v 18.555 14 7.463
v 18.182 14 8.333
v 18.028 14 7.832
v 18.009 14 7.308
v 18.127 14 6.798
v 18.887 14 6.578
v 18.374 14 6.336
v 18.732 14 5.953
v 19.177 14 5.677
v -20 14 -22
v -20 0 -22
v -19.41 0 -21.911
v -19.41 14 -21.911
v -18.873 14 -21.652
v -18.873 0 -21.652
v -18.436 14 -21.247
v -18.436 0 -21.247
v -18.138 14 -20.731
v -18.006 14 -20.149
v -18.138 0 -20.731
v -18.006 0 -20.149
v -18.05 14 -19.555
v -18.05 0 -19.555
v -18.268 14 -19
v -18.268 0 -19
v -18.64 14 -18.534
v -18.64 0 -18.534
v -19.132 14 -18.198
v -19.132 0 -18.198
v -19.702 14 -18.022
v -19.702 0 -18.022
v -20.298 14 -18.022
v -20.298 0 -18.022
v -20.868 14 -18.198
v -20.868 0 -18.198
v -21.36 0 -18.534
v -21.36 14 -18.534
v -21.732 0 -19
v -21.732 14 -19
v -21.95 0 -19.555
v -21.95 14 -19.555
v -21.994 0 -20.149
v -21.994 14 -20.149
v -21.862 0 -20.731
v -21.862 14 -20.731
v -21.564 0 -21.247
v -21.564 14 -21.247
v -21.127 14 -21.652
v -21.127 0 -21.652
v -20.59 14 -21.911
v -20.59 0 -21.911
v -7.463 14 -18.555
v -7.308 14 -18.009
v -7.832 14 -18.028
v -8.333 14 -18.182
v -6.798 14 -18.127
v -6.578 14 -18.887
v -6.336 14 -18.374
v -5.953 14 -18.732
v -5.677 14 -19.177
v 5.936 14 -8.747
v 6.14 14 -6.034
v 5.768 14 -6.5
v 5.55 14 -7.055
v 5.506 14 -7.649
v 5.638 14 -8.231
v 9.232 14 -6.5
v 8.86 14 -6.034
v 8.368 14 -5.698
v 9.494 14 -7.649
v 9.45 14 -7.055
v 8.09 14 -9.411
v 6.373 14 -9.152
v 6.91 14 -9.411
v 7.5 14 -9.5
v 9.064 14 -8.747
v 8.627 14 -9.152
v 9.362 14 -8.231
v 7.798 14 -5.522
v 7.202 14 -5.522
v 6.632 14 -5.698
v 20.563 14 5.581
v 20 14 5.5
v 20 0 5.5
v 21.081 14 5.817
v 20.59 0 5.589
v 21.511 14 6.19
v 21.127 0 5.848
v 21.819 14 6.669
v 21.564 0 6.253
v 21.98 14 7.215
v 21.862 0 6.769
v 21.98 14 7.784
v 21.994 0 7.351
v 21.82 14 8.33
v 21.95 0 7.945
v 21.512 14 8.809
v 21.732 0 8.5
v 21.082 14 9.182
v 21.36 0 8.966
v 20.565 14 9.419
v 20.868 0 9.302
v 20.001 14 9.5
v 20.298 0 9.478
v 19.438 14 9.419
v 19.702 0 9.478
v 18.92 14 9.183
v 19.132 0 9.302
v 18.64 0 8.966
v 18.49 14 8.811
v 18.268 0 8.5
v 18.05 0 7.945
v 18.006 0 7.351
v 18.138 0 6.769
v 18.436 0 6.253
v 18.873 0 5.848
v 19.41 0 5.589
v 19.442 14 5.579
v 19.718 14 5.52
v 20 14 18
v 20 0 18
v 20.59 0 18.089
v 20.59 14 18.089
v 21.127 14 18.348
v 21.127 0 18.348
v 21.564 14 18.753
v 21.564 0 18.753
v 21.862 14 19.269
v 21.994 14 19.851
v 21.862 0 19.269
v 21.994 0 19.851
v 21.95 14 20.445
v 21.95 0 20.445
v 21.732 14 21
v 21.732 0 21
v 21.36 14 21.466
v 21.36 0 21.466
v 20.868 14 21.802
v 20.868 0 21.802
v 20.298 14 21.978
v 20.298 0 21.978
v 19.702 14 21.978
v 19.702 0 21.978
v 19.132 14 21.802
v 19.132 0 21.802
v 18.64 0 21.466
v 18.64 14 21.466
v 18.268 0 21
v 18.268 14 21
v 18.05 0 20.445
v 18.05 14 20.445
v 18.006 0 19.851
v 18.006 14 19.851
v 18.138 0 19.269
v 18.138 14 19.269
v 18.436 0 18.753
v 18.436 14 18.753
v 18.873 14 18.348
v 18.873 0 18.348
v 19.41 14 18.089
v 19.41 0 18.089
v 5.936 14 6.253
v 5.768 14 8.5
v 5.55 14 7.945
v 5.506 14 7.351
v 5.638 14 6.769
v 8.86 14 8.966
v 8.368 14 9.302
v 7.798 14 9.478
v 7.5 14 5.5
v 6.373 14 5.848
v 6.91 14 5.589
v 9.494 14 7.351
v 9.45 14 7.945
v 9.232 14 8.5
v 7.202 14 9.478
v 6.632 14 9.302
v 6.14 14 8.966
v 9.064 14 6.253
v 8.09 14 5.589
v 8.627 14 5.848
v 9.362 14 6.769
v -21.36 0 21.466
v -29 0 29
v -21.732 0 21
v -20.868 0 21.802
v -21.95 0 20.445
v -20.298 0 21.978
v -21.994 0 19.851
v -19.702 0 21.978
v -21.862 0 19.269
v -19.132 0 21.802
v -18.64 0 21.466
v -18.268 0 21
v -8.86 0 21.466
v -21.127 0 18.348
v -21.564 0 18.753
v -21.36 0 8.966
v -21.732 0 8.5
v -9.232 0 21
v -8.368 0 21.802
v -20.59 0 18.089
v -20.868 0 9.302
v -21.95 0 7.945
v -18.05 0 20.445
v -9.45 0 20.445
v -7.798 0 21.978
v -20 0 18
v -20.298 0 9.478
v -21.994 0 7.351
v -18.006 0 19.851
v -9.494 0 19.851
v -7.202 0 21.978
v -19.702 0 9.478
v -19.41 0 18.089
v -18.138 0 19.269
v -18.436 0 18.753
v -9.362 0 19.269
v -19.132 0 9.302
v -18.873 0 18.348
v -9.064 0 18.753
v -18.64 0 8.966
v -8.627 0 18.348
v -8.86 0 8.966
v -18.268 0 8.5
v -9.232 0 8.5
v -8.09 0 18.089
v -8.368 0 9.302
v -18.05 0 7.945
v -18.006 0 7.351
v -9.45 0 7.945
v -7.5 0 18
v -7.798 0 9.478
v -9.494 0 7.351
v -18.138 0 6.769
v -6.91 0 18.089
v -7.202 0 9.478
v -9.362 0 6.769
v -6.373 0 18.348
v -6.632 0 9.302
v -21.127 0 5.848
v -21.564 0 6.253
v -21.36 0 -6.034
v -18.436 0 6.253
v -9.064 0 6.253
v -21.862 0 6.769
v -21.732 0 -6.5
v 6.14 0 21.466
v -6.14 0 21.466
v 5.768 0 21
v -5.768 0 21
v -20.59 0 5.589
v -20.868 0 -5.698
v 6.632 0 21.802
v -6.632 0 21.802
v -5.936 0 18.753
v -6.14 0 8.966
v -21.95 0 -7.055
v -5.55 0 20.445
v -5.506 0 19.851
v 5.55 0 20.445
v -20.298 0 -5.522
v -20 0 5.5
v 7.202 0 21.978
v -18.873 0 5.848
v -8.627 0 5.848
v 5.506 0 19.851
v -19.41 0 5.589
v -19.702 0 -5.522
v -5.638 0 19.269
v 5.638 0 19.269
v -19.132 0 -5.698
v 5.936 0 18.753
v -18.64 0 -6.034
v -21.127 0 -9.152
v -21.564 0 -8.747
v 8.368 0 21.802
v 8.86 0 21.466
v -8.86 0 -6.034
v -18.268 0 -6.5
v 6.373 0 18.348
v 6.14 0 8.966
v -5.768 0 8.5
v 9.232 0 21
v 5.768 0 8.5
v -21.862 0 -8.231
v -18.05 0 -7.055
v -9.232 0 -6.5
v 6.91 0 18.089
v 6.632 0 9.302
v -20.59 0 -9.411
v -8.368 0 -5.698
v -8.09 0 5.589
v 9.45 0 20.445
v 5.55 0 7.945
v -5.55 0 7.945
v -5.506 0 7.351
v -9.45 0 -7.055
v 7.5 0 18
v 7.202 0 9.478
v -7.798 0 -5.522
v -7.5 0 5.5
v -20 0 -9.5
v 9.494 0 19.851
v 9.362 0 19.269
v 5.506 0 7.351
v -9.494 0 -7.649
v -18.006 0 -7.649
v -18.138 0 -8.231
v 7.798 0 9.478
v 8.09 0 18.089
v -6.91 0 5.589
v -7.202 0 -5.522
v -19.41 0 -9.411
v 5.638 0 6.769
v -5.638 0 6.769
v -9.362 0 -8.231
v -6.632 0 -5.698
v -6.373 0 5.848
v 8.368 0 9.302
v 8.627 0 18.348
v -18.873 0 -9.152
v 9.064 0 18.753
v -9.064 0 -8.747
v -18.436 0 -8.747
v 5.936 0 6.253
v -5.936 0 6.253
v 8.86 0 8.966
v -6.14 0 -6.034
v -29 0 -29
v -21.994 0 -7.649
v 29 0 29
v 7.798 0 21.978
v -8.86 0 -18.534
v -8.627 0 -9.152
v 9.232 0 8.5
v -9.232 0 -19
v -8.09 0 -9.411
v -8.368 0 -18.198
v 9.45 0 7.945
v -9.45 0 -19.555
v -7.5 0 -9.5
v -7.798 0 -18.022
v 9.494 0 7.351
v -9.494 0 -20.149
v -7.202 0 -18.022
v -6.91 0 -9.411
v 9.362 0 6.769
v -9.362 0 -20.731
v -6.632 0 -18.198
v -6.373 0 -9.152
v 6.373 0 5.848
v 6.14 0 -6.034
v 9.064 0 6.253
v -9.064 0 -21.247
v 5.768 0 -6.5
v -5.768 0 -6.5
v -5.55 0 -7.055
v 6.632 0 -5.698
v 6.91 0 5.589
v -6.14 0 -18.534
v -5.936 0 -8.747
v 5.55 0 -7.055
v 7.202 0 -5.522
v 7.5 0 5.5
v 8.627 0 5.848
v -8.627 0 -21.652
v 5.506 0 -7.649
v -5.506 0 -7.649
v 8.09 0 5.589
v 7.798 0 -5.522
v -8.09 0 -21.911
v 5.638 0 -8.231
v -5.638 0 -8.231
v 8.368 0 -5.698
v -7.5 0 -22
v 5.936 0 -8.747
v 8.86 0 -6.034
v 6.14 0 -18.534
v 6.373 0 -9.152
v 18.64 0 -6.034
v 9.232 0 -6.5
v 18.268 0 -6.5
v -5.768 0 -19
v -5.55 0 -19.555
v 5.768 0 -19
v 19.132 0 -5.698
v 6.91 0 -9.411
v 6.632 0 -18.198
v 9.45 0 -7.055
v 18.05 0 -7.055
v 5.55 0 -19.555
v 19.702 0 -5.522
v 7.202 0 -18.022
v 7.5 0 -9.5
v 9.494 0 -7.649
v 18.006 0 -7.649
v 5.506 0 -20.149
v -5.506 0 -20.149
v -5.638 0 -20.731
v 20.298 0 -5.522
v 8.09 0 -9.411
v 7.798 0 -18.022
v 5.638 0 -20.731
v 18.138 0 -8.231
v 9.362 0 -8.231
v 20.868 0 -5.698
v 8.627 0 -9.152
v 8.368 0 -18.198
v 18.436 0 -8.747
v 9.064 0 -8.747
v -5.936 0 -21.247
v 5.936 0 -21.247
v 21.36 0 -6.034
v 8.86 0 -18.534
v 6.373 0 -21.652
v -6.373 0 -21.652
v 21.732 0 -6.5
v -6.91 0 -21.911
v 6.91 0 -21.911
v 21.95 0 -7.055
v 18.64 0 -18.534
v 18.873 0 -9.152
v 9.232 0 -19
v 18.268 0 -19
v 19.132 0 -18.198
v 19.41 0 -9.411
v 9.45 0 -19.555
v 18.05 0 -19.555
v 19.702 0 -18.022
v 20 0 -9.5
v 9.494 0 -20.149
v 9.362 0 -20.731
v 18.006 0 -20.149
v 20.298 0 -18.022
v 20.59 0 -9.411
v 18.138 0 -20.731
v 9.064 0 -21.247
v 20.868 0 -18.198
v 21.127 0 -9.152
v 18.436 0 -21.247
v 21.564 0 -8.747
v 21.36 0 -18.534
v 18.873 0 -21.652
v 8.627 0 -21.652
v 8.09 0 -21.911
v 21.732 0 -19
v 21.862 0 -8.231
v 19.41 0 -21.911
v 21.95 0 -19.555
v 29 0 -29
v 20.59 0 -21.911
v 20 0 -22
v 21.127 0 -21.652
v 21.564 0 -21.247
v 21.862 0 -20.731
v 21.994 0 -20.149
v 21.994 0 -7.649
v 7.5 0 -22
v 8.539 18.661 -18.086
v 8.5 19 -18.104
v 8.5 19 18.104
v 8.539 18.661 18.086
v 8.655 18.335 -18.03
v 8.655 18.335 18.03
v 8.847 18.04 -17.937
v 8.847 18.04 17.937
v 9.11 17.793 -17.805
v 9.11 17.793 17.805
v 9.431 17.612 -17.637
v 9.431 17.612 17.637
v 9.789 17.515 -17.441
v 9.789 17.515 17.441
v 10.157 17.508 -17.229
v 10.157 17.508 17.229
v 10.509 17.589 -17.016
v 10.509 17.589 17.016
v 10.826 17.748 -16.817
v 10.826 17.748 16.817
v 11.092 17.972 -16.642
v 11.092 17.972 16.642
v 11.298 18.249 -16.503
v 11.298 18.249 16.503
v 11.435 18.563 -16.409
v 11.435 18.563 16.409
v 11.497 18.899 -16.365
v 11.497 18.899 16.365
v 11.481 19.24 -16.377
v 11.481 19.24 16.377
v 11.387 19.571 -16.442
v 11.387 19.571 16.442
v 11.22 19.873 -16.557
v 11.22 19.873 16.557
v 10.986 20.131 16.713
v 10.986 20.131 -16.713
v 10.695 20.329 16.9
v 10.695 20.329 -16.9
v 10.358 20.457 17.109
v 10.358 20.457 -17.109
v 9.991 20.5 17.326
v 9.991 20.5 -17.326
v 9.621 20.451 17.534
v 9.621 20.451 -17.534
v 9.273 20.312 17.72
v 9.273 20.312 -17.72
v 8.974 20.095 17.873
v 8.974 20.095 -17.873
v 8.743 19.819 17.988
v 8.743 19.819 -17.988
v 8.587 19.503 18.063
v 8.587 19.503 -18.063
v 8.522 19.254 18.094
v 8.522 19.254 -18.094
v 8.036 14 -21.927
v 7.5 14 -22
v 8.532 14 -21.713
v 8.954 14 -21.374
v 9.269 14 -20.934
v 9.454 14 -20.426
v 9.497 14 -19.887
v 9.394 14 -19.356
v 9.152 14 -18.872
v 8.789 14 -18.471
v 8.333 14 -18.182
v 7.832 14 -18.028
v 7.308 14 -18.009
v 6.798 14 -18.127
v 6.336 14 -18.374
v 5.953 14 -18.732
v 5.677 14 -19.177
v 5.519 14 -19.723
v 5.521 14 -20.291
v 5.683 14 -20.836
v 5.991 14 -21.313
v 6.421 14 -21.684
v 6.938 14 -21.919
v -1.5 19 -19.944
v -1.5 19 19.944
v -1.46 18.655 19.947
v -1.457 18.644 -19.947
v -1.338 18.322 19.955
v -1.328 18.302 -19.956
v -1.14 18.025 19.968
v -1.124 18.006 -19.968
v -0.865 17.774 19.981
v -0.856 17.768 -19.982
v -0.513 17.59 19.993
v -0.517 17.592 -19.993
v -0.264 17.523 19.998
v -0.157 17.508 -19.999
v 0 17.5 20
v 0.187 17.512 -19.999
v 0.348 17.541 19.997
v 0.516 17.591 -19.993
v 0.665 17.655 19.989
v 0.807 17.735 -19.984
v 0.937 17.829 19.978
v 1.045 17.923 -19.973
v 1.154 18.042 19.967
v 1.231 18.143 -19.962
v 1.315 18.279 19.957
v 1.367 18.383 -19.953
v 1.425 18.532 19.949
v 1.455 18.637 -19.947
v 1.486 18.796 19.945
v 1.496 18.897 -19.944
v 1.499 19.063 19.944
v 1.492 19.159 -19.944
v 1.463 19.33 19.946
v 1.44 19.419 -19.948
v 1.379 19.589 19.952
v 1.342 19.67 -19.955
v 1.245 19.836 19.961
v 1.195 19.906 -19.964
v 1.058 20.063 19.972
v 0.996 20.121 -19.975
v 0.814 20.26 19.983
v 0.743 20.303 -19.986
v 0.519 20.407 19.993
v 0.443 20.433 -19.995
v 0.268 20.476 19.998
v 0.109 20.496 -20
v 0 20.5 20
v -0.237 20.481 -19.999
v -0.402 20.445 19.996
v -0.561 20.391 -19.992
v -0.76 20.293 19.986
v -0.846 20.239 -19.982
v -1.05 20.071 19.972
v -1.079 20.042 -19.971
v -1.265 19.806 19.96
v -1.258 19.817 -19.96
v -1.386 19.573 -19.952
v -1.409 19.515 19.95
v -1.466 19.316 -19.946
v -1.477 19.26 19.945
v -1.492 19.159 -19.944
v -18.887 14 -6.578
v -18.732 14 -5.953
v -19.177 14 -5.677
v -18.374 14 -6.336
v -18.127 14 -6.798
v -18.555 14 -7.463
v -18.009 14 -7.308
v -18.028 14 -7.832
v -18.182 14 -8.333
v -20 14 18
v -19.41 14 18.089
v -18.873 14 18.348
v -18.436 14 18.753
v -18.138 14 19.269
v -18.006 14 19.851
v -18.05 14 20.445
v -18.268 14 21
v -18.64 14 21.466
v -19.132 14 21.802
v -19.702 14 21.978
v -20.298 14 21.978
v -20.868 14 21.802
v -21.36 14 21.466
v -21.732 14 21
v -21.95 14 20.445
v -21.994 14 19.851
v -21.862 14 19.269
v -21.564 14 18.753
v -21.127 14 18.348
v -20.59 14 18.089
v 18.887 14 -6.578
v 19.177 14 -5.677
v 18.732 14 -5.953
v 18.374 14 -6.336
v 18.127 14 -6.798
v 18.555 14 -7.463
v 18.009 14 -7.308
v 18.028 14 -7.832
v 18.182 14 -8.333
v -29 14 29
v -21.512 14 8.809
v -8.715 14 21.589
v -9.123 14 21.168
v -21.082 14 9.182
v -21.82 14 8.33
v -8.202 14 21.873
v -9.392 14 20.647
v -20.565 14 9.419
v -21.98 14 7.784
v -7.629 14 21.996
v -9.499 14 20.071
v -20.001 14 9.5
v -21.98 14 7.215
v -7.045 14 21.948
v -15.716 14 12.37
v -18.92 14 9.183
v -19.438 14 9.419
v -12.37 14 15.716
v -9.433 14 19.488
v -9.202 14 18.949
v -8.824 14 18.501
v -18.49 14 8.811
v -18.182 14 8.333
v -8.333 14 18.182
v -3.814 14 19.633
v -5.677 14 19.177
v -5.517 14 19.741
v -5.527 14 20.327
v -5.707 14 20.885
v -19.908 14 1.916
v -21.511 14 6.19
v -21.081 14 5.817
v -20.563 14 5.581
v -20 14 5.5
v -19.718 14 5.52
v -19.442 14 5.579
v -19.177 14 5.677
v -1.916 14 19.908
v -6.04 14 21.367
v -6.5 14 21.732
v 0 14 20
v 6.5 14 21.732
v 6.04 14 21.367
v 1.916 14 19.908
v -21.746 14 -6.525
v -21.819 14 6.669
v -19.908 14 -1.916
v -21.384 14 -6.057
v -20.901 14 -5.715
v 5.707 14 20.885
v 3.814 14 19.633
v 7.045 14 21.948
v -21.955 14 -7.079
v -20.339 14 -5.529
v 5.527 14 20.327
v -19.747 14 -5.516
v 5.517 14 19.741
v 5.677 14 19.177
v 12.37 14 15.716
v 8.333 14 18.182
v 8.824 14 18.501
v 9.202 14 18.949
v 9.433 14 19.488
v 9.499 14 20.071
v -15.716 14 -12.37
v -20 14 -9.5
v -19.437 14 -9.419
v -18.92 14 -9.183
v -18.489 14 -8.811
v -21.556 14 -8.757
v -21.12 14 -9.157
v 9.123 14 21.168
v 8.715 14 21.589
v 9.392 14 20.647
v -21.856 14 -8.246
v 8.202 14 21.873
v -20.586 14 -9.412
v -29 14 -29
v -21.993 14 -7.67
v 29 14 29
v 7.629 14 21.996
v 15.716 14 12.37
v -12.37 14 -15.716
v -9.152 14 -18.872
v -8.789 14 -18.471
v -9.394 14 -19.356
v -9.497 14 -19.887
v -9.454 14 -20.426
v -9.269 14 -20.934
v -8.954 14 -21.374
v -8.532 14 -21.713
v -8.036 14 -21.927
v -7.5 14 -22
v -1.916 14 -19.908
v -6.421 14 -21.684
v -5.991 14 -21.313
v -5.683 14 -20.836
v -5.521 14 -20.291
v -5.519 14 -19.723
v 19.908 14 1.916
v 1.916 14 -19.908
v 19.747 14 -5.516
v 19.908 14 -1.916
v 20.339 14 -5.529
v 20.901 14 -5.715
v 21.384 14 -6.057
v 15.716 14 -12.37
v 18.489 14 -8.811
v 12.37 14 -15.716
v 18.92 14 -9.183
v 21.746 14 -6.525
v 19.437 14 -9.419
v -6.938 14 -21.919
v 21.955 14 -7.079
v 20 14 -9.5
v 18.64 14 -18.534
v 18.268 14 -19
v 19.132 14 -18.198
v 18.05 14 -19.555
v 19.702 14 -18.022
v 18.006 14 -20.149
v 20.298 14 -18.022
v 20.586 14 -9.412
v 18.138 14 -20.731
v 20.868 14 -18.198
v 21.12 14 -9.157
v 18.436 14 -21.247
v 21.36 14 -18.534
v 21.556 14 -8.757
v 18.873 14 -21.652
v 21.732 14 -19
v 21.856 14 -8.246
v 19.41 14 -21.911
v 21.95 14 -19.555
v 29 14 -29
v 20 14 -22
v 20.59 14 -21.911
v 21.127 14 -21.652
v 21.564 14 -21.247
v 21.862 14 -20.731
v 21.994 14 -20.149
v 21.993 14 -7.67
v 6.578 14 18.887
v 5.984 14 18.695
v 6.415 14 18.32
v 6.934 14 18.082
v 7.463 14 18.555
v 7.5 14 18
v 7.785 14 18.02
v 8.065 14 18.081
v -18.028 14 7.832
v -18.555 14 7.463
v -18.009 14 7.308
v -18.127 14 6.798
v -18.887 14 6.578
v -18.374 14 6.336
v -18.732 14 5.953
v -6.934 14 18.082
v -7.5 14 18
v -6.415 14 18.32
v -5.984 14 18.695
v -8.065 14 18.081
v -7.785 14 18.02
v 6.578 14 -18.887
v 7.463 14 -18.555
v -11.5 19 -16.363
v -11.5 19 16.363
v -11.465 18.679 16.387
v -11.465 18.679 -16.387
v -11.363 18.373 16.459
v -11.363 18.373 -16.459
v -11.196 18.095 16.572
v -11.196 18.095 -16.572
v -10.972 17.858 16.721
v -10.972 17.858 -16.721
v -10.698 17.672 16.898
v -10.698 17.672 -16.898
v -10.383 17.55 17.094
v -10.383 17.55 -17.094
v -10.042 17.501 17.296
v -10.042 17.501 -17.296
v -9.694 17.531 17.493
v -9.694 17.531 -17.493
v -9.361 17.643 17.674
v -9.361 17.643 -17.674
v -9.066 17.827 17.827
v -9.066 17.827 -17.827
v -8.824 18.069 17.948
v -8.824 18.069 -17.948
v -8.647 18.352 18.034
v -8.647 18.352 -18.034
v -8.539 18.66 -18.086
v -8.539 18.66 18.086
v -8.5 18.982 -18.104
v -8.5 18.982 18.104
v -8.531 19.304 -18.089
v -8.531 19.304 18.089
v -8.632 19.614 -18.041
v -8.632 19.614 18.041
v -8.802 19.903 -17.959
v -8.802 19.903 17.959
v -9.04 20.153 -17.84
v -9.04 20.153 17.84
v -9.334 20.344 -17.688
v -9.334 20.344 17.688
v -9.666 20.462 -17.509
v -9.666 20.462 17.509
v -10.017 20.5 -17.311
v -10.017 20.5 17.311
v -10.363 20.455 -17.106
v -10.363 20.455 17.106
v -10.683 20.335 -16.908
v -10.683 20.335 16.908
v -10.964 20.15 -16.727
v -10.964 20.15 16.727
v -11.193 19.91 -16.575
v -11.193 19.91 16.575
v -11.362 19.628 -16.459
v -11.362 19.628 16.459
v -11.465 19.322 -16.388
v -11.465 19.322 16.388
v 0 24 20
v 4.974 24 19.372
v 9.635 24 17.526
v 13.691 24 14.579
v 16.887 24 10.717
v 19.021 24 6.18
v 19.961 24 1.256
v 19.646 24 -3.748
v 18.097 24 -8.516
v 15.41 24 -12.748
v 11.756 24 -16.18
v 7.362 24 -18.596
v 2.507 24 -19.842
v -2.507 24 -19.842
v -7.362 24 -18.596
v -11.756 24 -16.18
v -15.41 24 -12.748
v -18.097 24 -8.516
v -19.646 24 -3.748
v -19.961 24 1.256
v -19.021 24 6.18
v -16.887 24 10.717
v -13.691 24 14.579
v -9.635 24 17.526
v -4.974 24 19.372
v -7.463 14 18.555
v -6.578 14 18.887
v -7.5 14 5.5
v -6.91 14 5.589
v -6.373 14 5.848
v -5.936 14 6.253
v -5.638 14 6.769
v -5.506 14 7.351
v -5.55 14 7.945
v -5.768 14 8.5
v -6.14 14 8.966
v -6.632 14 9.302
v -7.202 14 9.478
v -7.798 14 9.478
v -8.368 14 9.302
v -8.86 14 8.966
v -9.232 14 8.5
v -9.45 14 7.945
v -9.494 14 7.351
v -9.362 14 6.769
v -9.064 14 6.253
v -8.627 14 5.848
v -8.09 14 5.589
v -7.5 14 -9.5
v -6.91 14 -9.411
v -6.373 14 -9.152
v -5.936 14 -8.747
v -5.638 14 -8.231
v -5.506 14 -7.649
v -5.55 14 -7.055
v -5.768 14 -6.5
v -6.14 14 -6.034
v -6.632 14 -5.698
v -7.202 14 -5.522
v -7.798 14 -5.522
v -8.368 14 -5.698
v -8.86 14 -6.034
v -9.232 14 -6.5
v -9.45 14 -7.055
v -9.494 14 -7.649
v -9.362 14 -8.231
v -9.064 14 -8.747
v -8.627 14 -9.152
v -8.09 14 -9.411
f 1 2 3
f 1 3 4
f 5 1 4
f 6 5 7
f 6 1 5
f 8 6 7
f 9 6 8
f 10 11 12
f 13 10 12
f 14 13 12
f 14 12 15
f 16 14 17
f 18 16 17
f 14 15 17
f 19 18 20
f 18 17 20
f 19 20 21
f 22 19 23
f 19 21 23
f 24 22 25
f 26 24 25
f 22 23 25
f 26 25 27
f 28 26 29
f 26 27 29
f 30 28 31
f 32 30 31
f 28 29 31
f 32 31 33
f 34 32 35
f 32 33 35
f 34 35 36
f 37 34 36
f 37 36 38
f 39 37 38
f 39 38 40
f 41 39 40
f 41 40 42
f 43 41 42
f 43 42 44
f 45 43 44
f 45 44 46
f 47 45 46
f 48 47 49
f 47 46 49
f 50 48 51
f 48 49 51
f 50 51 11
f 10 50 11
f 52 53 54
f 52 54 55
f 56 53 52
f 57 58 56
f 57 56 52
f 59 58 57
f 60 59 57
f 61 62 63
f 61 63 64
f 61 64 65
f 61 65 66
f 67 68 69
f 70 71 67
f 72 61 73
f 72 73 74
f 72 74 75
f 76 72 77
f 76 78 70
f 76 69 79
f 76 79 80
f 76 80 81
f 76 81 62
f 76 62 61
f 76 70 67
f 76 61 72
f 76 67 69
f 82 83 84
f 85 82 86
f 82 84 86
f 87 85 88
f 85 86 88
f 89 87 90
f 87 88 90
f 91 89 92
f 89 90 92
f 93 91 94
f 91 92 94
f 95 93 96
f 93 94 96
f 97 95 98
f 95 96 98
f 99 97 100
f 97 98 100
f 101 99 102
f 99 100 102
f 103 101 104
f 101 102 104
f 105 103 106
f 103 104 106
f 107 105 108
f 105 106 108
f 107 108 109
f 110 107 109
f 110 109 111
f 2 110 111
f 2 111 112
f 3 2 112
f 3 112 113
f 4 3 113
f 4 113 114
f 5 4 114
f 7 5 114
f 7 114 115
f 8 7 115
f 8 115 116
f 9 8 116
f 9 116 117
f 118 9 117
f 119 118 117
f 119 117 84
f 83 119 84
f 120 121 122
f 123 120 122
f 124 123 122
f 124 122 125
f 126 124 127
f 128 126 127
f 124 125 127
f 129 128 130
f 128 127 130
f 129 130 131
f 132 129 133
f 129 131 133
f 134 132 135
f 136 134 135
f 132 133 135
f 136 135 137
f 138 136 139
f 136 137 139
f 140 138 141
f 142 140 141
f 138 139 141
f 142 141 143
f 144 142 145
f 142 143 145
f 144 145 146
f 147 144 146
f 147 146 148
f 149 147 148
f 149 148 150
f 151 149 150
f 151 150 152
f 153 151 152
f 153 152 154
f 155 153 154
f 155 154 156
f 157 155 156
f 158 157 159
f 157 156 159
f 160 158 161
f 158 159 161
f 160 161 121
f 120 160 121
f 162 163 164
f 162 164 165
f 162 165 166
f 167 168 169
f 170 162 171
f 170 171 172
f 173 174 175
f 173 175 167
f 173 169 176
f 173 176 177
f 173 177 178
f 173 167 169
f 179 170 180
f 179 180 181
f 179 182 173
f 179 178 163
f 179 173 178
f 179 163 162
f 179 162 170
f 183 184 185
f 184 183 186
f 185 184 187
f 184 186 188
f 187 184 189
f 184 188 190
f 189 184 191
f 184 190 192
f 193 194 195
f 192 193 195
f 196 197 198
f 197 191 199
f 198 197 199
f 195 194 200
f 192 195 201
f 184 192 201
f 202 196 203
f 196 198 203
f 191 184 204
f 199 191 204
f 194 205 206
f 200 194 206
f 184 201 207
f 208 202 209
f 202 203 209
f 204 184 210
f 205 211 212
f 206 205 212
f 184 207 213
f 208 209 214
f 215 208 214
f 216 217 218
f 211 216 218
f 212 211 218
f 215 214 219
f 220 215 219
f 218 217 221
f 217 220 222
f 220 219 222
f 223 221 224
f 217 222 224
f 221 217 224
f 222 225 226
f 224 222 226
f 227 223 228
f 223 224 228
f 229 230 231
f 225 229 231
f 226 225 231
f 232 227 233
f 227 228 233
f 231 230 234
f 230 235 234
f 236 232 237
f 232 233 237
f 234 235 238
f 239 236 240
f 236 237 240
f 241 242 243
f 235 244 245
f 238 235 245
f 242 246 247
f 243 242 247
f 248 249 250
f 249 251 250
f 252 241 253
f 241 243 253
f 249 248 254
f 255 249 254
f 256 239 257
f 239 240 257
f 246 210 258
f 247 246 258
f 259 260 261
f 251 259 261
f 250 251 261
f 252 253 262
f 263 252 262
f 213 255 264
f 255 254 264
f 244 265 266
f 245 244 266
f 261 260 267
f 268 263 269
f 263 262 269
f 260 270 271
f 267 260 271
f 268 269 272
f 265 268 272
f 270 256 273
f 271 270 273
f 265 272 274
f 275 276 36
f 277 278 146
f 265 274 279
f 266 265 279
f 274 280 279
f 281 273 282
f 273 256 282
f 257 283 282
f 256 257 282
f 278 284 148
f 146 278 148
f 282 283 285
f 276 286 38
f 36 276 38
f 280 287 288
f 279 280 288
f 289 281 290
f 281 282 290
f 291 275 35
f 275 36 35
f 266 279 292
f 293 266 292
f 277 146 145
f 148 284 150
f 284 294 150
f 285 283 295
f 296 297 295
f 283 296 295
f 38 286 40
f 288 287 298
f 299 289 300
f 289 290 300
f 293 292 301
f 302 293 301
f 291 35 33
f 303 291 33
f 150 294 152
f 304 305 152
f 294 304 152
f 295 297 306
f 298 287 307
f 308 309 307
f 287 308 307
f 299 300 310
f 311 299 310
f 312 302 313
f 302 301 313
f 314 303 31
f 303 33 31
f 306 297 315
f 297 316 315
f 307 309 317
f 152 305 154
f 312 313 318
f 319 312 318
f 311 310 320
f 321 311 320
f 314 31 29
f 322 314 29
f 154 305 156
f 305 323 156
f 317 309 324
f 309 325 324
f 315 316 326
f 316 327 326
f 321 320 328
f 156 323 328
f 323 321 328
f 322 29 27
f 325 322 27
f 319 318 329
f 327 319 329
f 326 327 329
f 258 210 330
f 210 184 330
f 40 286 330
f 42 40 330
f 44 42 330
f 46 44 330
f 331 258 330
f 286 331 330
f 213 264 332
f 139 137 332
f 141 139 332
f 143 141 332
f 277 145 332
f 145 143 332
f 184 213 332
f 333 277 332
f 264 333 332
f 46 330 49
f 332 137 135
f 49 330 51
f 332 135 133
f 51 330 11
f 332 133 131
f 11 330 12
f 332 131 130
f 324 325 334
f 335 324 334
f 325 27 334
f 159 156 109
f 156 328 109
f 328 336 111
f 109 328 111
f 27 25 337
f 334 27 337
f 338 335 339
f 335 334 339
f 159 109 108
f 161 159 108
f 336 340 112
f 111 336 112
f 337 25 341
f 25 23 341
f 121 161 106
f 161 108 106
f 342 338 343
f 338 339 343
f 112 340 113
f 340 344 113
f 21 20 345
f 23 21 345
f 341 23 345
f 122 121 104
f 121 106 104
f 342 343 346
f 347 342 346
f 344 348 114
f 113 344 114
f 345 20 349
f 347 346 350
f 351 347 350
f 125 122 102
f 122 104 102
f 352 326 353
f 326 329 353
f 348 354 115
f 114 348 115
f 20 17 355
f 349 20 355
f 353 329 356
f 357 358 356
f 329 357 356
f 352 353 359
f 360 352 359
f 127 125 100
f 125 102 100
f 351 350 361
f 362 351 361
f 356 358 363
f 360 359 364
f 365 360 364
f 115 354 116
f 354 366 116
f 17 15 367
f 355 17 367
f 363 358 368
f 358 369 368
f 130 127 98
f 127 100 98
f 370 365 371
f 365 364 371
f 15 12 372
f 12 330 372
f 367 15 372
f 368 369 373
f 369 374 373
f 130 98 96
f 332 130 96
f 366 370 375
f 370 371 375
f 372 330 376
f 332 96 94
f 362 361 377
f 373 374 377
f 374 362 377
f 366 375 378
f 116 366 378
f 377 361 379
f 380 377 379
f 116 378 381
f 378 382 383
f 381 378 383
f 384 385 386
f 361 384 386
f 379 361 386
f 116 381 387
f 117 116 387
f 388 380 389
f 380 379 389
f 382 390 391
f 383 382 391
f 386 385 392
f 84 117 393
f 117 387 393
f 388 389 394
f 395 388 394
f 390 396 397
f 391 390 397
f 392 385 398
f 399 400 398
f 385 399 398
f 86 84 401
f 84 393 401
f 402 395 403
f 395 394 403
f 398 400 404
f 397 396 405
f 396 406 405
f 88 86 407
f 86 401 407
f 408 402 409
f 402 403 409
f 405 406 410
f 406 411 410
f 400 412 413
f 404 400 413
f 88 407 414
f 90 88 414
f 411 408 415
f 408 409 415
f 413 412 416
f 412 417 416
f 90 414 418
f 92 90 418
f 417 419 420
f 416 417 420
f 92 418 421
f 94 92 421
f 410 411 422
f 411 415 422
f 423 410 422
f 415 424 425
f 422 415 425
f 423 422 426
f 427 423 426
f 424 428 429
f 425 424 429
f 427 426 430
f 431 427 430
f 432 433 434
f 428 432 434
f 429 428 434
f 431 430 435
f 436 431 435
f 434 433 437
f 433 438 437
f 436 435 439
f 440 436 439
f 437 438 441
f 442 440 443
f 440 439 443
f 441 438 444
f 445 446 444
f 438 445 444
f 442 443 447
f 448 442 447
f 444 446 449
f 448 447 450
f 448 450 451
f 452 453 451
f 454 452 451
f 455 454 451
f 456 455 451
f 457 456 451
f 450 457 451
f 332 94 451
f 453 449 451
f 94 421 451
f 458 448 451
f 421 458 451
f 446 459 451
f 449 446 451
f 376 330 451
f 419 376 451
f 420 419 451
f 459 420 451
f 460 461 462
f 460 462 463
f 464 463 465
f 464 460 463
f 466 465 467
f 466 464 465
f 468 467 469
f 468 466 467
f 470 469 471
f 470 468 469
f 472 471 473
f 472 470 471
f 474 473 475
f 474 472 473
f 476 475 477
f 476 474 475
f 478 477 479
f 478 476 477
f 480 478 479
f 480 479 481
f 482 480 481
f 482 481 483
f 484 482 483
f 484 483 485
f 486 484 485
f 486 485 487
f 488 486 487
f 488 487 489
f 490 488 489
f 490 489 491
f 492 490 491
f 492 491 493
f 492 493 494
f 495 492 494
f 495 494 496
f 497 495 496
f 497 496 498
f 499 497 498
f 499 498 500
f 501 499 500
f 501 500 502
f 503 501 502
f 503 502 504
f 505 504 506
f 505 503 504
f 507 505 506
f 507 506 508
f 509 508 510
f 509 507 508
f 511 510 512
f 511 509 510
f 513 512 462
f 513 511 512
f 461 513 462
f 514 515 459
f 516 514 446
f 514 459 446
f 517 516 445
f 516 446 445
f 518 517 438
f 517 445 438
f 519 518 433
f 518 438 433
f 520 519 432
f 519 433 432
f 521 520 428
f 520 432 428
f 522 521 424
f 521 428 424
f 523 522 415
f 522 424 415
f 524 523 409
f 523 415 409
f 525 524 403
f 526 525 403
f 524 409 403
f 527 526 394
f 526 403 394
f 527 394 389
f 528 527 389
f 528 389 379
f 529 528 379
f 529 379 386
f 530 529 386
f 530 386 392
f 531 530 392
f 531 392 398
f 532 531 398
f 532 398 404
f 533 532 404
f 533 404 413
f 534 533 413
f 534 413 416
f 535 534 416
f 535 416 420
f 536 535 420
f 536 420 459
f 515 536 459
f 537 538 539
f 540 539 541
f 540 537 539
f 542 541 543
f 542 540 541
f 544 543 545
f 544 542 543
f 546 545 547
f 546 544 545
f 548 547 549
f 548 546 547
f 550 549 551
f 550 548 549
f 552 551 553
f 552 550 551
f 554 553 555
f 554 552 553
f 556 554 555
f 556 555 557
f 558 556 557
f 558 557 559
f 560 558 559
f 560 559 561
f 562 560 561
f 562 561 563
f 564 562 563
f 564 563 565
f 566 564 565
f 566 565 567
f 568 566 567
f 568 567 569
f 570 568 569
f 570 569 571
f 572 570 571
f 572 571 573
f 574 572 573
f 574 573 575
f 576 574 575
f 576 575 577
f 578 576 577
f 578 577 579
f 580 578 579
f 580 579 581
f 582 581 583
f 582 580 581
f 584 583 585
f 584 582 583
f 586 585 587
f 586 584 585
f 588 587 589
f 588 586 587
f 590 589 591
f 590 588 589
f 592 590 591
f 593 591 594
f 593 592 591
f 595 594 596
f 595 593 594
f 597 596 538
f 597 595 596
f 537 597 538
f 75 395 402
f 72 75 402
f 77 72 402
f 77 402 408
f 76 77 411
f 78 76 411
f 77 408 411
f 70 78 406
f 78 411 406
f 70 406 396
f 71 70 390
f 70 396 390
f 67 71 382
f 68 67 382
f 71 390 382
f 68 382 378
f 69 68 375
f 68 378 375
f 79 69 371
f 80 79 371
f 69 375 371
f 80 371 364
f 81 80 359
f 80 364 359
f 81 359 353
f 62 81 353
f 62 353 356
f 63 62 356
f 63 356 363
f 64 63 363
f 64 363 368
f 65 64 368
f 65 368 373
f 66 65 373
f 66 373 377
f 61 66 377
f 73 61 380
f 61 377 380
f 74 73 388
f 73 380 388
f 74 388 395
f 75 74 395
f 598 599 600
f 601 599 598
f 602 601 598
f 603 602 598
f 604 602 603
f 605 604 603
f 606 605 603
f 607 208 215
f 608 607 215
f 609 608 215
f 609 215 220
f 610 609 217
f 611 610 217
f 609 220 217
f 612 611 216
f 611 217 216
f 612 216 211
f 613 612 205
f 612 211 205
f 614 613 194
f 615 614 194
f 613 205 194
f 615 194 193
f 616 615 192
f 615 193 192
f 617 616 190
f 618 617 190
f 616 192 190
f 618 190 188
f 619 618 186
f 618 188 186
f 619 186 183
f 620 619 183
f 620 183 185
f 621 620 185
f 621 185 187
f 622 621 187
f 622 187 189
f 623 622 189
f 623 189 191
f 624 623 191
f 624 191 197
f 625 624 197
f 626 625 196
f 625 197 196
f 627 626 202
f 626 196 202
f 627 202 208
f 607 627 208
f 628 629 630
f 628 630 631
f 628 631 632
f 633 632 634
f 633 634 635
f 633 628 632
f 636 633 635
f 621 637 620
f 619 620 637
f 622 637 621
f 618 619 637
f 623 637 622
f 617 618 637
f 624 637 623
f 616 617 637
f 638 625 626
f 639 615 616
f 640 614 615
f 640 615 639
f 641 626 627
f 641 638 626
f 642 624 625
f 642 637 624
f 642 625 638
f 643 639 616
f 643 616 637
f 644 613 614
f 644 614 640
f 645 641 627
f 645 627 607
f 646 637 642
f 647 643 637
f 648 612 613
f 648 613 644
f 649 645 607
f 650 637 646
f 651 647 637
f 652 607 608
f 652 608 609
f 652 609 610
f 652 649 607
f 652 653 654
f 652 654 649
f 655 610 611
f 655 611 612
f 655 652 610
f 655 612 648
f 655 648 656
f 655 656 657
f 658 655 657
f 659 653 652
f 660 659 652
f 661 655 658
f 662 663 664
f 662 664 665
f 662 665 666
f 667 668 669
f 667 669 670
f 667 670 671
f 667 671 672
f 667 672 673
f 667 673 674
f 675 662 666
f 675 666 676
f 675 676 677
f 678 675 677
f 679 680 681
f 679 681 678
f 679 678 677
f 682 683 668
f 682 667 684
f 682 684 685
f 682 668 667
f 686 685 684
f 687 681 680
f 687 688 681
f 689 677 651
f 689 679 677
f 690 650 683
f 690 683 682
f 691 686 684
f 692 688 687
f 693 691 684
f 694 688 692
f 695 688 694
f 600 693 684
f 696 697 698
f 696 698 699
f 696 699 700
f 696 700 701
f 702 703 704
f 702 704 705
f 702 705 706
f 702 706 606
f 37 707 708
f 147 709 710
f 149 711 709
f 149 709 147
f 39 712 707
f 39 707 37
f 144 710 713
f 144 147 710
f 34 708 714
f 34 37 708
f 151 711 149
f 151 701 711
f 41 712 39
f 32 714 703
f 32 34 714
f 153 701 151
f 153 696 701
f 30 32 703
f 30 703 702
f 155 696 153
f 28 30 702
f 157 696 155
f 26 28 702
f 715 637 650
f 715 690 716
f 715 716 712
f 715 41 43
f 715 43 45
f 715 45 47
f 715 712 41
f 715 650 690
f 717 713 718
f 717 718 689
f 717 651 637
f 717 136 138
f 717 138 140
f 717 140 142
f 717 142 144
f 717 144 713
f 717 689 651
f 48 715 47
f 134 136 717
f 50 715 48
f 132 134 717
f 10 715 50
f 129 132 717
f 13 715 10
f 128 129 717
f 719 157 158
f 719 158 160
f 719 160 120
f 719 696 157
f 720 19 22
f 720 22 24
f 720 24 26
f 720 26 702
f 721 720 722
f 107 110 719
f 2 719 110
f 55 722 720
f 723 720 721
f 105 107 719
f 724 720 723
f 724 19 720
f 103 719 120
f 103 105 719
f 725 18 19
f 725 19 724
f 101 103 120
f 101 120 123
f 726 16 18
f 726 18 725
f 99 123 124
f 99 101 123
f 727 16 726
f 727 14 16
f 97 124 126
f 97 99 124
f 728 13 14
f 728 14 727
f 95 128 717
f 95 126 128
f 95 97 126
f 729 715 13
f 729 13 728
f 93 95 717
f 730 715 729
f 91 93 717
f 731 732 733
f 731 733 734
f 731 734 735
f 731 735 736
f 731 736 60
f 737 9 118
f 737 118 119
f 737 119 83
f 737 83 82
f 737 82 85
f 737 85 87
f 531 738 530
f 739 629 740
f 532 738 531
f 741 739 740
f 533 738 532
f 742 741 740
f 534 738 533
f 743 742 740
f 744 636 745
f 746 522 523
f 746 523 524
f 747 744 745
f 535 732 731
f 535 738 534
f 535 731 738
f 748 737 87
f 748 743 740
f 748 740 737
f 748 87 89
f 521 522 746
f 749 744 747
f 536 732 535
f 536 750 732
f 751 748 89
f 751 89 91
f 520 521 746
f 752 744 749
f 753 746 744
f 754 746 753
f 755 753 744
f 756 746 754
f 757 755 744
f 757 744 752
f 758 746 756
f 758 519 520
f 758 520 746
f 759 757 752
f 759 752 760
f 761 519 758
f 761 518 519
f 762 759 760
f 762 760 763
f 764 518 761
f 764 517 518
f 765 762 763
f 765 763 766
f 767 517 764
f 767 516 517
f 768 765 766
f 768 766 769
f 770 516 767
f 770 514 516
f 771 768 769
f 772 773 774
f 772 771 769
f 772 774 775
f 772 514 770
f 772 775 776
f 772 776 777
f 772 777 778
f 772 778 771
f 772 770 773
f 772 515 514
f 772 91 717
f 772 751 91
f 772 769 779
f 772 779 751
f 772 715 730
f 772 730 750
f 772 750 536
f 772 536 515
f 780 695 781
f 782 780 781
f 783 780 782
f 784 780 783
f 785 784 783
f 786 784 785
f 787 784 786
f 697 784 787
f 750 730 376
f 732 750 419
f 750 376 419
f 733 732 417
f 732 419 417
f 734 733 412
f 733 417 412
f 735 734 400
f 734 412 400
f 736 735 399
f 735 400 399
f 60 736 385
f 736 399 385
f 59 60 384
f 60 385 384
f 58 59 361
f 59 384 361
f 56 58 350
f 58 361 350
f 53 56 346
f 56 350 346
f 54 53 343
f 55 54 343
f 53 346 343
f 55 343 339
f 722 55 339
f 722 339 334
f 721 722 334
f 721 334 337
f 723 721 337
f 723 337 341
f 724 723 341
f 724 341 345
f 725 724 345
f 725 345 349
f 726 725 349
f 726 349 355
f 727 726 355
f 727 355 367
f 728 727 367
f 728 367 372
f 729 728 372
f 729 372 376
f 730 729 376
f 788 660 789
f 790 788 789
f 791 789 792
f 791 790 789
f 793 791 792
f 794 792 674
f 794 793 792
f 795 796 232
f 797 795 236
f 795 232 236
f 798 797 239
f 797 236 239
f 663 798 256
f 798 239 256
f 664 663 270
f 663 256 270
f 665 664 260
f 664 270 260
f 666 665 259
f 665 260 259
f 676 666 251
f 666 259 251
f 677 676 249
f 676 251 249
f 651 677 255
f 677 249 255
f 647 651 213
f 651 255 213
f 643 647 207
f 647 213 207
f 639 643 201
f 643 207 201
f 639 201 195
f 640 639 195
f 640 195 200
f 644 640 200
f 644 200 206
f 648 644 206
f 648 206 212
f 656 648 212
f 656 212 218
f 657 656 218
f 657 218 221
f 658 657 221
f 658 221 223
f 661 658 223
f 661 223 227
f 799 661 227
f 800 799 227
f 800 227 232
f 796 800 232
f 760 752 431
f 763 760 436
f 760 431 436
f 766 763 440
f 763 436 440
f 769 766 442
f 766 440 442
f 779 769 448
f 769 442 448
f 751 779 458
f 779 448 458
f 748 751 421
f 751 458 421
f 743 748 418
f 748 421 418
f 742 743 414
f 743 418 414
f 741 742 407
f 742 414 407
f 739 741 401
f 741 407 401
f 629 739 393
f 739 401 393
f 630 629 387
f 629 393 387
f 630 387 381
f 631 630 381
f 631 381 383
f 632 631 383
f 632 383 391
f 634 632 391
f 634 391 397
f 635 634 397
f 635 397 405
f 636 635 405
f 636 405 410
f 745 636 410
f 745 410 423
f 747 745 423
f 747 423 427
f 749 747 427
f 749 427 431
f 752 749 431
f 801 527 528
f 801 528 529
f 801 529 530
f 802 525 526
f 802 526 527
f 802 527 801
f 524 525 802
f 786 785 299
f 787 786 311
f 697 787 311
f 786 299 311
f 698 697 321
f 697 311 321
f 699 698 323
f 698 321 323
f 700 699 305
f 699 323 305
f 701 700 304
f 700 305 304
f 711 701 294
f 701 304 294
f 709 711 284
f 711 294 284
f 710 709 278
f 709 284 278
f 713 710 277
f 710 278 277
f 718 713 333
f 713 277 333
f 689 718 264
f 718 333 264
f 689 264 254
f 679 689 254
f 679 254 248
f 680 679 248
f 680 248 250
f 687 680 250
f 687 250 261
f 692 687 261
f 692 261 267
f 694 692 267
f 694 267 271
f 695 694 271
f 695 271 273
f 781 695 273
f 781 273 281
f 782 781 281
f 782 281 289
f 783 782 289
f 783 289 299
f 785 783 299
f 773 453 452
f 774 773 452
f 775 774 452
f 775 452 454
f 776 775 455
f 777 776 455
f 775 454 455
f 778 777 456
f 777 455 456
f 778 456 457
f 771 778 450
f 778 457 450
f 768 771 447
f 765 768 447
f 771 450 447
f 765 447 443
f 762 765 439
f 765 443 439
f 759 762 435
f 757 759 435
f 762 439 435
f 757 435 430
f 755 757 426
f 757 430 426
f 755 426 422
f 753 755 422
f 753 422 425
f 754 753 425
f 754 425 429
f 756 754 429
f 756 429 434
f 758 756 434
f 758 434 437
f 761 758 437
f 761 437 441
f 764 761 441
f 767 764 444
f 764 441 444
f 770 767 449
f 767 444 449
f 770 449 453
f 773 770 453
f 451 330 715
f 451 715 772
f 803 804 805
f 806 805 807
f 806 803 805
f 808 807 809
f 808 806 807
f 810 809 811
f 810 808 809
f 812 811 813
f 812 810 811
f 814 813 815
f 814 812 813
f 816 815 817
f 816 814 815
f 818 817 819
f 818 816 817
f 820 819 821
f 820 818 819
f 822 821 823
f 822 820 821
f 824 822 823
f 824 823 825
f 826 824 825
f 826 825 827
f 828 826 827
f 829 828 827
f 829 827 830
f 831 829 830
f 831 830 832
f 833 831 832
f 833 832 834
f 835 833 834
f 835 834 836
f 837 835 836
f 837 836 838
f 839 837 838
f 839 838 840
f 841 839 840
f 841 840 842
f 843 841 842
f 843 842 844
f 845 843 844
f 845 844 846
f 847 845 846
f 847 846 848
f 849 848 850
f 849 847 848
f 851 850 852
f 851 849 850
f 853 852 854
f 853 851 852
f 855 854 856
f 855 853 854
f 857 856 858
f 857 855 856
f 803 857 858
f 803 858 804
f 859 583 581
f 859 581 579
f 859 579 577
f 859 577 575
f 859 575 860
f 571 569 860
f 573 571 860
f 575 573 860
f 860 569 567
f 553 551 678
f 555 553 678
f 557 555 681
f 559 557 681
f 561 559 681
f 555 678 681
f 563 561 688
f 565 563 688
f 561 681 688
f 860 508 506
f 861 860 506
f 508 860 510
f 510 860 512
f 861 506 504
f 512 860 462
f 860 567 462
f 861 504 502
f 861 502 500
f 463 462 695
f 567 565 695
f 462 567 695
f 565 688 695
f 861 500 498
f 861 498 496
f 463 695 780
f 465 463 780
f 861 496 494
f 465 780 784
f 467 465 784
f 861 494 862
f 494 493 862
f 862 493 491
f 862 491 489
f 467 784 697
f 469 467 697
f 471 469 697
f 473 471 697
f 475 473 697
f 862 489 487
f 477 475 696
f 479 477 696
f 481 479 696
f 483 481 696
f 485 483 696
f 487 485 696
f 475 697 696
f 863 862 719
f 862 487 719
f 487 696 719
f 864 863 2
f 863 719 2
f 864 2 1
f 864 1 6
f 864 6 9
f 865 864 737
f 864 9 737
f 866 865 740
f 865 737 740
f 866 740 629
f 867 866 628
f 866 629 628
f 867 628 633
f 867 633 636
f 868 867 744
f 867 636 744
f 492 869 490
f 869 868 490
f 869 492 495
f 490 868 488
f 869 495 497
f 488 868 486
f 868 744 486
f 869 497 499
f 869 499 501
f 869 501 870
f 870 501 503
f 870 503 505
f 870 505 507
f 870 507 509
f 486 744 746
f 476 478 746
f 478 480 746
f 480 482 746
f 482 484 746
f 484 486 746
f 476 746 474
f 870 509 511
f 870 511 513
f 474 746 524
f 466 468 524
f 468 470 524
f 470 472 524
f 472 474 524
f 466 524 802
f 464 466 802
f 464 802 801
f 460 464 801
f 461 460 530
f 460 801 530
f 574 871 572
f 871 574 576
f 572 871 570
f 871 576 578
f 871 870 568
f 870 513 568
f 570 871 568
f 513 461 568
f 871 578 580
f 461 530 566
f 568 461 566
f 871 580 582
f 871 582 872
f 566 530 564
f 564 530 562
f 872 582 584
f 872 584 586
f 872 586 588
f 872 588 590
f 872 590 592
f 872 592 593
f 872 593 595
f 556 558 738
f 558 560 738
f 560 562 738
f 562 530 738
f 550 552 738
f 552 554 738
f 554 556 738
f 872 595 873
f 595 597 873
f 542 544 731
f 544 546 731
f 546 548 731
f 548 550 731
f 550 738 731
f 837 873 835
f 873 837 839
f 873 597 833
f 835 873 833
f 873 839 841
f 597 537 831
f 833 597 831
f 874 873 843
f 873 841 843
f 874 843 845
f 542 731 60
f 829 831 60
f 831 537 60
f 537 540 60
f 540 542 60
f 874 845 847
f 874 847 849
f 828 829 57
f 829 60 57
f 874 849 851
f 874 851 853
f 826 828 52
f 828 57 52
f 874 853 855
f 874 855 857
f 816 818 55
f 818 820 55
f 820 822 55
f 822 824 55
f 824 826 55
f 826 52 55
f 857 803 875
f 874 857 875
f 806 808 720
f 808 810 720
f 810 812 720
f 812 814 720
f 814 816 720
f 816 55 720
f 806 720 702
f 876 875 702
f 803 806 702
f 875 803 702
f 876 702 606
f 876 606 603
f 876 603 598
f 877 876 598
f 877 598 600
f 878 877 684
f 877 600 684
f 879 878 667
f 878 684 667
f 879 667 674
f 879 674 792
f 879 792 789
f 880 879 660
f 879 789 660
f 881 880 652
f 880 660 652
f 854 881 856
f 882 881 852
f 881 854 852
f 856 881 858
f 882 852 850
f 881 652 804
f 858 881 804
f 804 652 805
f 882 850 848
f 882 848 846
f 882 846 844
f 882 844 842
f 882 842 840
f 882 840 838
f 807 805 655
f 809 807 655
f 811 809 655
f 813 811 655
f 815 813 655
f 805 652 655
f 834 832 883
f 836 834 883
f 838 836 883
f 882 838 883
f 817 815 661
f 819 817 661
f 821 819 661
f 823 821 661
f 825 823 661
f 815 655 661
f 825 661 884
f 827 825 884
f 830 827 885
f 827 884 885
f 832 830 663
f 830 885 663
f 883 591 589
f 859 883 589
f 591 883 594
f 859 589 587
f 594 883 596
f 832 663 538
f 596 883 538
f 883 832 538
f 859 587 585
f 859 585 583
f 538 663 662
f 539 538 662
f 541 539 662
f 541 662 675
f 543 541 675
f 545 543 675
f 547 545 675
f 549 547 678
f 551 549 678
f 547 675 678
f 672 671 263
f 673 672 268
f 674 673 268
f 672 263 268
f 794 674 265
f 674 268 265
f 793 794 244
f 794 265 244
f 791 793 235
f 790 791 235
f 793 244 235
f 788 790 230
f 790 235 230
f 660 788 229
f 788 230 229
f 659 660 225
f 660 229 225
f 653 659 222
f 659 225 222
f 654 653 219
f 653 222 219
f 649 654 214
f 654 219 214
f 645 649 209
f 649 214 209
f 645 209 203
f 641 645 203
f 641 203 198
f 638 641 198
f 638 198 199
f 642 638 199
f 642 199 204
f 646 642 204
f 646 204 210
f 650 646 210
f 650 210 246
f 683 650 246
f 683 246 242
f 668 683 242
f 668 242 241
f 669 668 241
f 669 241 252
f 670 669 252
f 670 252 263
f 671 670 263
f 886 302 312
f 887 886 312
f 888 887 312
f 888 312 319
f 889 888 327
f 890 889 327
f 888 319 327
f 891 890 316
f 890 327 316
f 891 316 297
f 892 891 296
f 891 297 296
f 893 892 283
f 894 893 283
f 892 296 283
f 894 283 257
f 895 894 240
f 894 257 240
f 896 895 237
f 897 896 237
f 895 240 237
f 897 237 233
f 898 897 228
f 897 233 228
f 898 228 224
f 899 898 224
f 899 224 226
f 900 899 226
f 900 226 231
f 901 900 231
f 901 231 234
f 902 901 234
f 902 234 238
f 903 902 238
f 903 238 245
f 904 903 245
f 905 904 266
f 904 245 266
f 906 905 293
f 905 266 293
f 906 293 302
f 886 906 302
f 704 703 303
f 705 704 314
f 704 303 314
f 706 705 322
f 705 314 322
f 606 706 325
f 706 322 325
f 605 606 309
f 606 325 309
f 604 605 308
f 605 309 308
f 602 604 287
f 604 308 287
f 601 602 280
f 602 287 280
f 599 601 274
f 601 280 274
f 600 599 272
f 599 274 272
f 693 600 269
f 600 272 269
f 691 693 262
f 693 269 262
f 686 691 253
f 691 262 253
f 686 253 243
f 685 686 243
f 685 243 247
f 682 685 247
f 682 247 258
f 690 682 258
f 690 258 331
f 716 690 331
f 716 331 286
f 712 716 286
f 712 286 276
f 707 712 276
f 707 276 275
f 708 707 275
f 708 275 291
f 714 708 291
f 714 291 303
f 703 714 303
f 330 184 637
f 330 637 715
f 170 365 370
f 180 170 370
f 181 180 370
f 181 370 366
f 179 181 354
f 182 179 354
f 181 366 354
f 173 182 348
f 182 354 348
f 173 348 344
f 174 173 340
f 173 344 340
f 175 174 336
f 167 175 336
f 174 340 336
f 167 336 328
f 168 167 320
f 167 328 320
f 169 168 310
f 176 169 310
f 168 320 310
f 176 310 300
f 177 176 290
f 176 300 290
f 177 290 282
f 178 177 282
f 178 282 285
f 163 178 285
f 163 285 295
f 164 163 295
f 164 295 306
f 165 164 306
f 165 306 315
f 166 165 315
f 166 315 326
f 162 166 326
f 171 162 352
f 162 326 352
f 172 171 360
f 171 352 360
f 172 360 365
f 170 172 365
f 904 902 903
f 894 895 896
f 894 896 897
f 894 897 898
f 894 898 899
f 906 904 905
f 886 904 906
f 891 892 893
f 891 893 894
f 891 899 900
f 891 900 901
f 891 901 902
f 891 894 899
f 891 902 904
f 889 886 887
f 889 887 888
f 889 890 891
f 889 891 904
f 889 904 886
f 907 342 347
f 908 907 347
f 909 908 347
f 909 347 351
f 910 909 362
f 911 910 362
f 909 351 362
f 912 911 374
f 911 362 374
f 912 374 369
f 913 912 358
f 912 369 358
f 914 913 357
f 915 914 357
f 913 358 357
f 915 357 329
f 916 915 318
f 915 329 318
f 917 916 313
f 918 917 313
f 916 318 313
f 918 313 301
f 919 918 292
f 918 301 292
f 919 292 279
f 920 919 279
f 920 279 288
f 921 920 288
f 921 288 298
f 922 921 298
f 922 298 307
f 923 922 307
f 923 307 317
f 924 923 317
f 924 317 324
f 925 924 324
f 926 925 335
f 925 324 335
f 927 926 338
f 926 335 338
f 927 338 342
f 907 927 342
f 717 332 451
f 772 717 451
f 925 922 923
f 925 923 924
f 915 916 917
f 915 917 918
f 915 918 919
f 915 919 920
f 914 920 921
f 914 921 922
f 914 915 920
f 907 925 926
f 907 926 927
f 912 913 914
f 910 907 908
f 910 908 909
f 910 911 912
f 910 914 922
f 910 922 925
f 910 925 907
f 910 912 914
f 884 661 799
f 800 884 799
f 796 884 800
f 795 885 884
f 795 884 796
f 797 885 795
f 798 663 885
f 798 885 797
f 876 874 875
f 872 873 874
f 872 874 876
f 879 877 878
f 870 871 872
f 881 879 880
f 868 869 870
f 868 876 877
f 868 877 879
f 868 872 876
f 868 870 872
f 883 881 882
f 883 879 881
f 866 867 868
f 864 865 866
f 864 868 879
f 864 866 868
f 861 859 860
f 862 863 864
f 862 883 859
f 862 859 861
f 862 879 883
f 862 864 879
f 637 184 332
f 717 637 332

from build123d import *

# Parameters (mm, degrees)
SKETCH_4_W               = 58
SKETCH_4_H               = 58
EXTRUDE_3_DEPTH          = 14
SKETCH_6_R               = 20
EXTRUDE_4_DEPTH          = 10
CUT_EXTRUDE_1_DEPTH      = 30
CUT_EXTRUDE_1_DEPTH_BACK = 30
SKETCH_7_R               = 1.5
SKETCH_8_R               = 2
CUT_EXTRUDE_2_DEPTH      = 14


with BuildPart() as part:
    # 草图4 → 凸台-拉伸3 (new body)
    with BuildSketch(Plane(origin=(0, 0, 0), x_dir=(1, 0, 0), z_dir=(0, 1, 0))):
        Rectangle(SKETCH_4_W, SKETCH_4_H)
    extrude(amount=EXTRUDE_3_DEPTH)

    # 草图6 → 凸台-拉伸4 (add)
    with BuildSketch(Plane(origin=(0, 14, 0), x_dir=(1, 0, 0), z_dir=(0, 1, 0))):
        with Locations(Location((0, 0, 0), (0, 0, 270))):
            Circle(SKETCH_6_R)
    extrude(amount=EXTRUDE_4_DEPTH)

    # 草图7 → 切除-拉伸1 (cut, two sides: drawn at the far end of the back side and taken through both)
    with BuildSketch(Plane.XY.offset(-CUT_EXTRUDE_1_DEPTH_BACK)):
        with Locations(Location((-10, 19, 0), (0, 0, 180))):
            Circle(SKETCH_7_R)
        with Locations(Location((10, 19, 0), (0, 0, 180))):
            Circle(SKETCH_7_R)
        with Locations(Location((0, 19, 0), (0, 0, 180))):
            Circle(SKETCH_7_R)
    extrude(amount=CUT_EXTRUDE_1_DEPTH + CUT_EXTRUDE_1_DEPTH_BACK, mode=Mode.SUBTRACT)

    # 草图8 → 切除-拉伸2 (cut)
    with BuildSketch(Plane.XZ):
        with Locations(Location((-7.5, 7.5, 0), (0, 0, 270))):
            Circle(SKETCH_8_R)
        with Locations(Location((7.5, 7.5, 0), (0, 0, 270))):
            Circle(SKETCH_8_R)
        with Locations(Location((-20, 20, 0), (0, 0, 270))):
            Circle(SKETCH_8_R)
        with Locations(Location((20, 20, 0), (0, 0, 270))):
            Circle(SKETCH_8_R)
        with Locations(Location((-20, -20, 0), (0, 0, 270))):
            Circle(SKETCH_8_R)
        with Locations(Location((-7.5, -7.5, 0), (0, 0, 270))):
            Circle(SKETCH_8_R)
        with Locations(Location((7.5, -7.5, 0), (0, 0, 270))):
            Circle(SKETCH_8_R)
        with Locations(Location((20, -20, 0), (0, 0, 270))):
            Circle(SKETCH_8_R)
        with Locations(Location((-20, 7.5, 0), (0, 0, 270))):
            Circle(SKETCH_8_R)
        with Locations(Location((-20, -7.5, 0), (0, 0, 270))):
            Circle(SKETCH_8_R)
        with Locations(Location((-7.5, -20, 0), (0, 0, 270))):
            Circle(SKETCH_8_R)
        with Locations(Location((7.5, -20, 0), (0, 0, 270))):
            Circle(SKETCH_8_R)
        with Locations(Location((20, -7.5, 0), (0, 0, 270))):
            Circle(SKETCH_8_R)
        with Locations(Location((20, 7.5, 0), (0, 0, 270))):
            Circle(SKETCH_8_R)
        with Locations(Location((-7.5, 20, 0), (0, 0, 270))):
            Circle(SKETCH_8_R)
        with Locations(Location((7.5, 20, 0), (0, 0, 270))):
            Circle(SKETCH_8_R)
    extrude(amount=-CUT_EXTRUDE_2_DEPTH, mode=Mode.SUBTRACT)


solid = part.part
